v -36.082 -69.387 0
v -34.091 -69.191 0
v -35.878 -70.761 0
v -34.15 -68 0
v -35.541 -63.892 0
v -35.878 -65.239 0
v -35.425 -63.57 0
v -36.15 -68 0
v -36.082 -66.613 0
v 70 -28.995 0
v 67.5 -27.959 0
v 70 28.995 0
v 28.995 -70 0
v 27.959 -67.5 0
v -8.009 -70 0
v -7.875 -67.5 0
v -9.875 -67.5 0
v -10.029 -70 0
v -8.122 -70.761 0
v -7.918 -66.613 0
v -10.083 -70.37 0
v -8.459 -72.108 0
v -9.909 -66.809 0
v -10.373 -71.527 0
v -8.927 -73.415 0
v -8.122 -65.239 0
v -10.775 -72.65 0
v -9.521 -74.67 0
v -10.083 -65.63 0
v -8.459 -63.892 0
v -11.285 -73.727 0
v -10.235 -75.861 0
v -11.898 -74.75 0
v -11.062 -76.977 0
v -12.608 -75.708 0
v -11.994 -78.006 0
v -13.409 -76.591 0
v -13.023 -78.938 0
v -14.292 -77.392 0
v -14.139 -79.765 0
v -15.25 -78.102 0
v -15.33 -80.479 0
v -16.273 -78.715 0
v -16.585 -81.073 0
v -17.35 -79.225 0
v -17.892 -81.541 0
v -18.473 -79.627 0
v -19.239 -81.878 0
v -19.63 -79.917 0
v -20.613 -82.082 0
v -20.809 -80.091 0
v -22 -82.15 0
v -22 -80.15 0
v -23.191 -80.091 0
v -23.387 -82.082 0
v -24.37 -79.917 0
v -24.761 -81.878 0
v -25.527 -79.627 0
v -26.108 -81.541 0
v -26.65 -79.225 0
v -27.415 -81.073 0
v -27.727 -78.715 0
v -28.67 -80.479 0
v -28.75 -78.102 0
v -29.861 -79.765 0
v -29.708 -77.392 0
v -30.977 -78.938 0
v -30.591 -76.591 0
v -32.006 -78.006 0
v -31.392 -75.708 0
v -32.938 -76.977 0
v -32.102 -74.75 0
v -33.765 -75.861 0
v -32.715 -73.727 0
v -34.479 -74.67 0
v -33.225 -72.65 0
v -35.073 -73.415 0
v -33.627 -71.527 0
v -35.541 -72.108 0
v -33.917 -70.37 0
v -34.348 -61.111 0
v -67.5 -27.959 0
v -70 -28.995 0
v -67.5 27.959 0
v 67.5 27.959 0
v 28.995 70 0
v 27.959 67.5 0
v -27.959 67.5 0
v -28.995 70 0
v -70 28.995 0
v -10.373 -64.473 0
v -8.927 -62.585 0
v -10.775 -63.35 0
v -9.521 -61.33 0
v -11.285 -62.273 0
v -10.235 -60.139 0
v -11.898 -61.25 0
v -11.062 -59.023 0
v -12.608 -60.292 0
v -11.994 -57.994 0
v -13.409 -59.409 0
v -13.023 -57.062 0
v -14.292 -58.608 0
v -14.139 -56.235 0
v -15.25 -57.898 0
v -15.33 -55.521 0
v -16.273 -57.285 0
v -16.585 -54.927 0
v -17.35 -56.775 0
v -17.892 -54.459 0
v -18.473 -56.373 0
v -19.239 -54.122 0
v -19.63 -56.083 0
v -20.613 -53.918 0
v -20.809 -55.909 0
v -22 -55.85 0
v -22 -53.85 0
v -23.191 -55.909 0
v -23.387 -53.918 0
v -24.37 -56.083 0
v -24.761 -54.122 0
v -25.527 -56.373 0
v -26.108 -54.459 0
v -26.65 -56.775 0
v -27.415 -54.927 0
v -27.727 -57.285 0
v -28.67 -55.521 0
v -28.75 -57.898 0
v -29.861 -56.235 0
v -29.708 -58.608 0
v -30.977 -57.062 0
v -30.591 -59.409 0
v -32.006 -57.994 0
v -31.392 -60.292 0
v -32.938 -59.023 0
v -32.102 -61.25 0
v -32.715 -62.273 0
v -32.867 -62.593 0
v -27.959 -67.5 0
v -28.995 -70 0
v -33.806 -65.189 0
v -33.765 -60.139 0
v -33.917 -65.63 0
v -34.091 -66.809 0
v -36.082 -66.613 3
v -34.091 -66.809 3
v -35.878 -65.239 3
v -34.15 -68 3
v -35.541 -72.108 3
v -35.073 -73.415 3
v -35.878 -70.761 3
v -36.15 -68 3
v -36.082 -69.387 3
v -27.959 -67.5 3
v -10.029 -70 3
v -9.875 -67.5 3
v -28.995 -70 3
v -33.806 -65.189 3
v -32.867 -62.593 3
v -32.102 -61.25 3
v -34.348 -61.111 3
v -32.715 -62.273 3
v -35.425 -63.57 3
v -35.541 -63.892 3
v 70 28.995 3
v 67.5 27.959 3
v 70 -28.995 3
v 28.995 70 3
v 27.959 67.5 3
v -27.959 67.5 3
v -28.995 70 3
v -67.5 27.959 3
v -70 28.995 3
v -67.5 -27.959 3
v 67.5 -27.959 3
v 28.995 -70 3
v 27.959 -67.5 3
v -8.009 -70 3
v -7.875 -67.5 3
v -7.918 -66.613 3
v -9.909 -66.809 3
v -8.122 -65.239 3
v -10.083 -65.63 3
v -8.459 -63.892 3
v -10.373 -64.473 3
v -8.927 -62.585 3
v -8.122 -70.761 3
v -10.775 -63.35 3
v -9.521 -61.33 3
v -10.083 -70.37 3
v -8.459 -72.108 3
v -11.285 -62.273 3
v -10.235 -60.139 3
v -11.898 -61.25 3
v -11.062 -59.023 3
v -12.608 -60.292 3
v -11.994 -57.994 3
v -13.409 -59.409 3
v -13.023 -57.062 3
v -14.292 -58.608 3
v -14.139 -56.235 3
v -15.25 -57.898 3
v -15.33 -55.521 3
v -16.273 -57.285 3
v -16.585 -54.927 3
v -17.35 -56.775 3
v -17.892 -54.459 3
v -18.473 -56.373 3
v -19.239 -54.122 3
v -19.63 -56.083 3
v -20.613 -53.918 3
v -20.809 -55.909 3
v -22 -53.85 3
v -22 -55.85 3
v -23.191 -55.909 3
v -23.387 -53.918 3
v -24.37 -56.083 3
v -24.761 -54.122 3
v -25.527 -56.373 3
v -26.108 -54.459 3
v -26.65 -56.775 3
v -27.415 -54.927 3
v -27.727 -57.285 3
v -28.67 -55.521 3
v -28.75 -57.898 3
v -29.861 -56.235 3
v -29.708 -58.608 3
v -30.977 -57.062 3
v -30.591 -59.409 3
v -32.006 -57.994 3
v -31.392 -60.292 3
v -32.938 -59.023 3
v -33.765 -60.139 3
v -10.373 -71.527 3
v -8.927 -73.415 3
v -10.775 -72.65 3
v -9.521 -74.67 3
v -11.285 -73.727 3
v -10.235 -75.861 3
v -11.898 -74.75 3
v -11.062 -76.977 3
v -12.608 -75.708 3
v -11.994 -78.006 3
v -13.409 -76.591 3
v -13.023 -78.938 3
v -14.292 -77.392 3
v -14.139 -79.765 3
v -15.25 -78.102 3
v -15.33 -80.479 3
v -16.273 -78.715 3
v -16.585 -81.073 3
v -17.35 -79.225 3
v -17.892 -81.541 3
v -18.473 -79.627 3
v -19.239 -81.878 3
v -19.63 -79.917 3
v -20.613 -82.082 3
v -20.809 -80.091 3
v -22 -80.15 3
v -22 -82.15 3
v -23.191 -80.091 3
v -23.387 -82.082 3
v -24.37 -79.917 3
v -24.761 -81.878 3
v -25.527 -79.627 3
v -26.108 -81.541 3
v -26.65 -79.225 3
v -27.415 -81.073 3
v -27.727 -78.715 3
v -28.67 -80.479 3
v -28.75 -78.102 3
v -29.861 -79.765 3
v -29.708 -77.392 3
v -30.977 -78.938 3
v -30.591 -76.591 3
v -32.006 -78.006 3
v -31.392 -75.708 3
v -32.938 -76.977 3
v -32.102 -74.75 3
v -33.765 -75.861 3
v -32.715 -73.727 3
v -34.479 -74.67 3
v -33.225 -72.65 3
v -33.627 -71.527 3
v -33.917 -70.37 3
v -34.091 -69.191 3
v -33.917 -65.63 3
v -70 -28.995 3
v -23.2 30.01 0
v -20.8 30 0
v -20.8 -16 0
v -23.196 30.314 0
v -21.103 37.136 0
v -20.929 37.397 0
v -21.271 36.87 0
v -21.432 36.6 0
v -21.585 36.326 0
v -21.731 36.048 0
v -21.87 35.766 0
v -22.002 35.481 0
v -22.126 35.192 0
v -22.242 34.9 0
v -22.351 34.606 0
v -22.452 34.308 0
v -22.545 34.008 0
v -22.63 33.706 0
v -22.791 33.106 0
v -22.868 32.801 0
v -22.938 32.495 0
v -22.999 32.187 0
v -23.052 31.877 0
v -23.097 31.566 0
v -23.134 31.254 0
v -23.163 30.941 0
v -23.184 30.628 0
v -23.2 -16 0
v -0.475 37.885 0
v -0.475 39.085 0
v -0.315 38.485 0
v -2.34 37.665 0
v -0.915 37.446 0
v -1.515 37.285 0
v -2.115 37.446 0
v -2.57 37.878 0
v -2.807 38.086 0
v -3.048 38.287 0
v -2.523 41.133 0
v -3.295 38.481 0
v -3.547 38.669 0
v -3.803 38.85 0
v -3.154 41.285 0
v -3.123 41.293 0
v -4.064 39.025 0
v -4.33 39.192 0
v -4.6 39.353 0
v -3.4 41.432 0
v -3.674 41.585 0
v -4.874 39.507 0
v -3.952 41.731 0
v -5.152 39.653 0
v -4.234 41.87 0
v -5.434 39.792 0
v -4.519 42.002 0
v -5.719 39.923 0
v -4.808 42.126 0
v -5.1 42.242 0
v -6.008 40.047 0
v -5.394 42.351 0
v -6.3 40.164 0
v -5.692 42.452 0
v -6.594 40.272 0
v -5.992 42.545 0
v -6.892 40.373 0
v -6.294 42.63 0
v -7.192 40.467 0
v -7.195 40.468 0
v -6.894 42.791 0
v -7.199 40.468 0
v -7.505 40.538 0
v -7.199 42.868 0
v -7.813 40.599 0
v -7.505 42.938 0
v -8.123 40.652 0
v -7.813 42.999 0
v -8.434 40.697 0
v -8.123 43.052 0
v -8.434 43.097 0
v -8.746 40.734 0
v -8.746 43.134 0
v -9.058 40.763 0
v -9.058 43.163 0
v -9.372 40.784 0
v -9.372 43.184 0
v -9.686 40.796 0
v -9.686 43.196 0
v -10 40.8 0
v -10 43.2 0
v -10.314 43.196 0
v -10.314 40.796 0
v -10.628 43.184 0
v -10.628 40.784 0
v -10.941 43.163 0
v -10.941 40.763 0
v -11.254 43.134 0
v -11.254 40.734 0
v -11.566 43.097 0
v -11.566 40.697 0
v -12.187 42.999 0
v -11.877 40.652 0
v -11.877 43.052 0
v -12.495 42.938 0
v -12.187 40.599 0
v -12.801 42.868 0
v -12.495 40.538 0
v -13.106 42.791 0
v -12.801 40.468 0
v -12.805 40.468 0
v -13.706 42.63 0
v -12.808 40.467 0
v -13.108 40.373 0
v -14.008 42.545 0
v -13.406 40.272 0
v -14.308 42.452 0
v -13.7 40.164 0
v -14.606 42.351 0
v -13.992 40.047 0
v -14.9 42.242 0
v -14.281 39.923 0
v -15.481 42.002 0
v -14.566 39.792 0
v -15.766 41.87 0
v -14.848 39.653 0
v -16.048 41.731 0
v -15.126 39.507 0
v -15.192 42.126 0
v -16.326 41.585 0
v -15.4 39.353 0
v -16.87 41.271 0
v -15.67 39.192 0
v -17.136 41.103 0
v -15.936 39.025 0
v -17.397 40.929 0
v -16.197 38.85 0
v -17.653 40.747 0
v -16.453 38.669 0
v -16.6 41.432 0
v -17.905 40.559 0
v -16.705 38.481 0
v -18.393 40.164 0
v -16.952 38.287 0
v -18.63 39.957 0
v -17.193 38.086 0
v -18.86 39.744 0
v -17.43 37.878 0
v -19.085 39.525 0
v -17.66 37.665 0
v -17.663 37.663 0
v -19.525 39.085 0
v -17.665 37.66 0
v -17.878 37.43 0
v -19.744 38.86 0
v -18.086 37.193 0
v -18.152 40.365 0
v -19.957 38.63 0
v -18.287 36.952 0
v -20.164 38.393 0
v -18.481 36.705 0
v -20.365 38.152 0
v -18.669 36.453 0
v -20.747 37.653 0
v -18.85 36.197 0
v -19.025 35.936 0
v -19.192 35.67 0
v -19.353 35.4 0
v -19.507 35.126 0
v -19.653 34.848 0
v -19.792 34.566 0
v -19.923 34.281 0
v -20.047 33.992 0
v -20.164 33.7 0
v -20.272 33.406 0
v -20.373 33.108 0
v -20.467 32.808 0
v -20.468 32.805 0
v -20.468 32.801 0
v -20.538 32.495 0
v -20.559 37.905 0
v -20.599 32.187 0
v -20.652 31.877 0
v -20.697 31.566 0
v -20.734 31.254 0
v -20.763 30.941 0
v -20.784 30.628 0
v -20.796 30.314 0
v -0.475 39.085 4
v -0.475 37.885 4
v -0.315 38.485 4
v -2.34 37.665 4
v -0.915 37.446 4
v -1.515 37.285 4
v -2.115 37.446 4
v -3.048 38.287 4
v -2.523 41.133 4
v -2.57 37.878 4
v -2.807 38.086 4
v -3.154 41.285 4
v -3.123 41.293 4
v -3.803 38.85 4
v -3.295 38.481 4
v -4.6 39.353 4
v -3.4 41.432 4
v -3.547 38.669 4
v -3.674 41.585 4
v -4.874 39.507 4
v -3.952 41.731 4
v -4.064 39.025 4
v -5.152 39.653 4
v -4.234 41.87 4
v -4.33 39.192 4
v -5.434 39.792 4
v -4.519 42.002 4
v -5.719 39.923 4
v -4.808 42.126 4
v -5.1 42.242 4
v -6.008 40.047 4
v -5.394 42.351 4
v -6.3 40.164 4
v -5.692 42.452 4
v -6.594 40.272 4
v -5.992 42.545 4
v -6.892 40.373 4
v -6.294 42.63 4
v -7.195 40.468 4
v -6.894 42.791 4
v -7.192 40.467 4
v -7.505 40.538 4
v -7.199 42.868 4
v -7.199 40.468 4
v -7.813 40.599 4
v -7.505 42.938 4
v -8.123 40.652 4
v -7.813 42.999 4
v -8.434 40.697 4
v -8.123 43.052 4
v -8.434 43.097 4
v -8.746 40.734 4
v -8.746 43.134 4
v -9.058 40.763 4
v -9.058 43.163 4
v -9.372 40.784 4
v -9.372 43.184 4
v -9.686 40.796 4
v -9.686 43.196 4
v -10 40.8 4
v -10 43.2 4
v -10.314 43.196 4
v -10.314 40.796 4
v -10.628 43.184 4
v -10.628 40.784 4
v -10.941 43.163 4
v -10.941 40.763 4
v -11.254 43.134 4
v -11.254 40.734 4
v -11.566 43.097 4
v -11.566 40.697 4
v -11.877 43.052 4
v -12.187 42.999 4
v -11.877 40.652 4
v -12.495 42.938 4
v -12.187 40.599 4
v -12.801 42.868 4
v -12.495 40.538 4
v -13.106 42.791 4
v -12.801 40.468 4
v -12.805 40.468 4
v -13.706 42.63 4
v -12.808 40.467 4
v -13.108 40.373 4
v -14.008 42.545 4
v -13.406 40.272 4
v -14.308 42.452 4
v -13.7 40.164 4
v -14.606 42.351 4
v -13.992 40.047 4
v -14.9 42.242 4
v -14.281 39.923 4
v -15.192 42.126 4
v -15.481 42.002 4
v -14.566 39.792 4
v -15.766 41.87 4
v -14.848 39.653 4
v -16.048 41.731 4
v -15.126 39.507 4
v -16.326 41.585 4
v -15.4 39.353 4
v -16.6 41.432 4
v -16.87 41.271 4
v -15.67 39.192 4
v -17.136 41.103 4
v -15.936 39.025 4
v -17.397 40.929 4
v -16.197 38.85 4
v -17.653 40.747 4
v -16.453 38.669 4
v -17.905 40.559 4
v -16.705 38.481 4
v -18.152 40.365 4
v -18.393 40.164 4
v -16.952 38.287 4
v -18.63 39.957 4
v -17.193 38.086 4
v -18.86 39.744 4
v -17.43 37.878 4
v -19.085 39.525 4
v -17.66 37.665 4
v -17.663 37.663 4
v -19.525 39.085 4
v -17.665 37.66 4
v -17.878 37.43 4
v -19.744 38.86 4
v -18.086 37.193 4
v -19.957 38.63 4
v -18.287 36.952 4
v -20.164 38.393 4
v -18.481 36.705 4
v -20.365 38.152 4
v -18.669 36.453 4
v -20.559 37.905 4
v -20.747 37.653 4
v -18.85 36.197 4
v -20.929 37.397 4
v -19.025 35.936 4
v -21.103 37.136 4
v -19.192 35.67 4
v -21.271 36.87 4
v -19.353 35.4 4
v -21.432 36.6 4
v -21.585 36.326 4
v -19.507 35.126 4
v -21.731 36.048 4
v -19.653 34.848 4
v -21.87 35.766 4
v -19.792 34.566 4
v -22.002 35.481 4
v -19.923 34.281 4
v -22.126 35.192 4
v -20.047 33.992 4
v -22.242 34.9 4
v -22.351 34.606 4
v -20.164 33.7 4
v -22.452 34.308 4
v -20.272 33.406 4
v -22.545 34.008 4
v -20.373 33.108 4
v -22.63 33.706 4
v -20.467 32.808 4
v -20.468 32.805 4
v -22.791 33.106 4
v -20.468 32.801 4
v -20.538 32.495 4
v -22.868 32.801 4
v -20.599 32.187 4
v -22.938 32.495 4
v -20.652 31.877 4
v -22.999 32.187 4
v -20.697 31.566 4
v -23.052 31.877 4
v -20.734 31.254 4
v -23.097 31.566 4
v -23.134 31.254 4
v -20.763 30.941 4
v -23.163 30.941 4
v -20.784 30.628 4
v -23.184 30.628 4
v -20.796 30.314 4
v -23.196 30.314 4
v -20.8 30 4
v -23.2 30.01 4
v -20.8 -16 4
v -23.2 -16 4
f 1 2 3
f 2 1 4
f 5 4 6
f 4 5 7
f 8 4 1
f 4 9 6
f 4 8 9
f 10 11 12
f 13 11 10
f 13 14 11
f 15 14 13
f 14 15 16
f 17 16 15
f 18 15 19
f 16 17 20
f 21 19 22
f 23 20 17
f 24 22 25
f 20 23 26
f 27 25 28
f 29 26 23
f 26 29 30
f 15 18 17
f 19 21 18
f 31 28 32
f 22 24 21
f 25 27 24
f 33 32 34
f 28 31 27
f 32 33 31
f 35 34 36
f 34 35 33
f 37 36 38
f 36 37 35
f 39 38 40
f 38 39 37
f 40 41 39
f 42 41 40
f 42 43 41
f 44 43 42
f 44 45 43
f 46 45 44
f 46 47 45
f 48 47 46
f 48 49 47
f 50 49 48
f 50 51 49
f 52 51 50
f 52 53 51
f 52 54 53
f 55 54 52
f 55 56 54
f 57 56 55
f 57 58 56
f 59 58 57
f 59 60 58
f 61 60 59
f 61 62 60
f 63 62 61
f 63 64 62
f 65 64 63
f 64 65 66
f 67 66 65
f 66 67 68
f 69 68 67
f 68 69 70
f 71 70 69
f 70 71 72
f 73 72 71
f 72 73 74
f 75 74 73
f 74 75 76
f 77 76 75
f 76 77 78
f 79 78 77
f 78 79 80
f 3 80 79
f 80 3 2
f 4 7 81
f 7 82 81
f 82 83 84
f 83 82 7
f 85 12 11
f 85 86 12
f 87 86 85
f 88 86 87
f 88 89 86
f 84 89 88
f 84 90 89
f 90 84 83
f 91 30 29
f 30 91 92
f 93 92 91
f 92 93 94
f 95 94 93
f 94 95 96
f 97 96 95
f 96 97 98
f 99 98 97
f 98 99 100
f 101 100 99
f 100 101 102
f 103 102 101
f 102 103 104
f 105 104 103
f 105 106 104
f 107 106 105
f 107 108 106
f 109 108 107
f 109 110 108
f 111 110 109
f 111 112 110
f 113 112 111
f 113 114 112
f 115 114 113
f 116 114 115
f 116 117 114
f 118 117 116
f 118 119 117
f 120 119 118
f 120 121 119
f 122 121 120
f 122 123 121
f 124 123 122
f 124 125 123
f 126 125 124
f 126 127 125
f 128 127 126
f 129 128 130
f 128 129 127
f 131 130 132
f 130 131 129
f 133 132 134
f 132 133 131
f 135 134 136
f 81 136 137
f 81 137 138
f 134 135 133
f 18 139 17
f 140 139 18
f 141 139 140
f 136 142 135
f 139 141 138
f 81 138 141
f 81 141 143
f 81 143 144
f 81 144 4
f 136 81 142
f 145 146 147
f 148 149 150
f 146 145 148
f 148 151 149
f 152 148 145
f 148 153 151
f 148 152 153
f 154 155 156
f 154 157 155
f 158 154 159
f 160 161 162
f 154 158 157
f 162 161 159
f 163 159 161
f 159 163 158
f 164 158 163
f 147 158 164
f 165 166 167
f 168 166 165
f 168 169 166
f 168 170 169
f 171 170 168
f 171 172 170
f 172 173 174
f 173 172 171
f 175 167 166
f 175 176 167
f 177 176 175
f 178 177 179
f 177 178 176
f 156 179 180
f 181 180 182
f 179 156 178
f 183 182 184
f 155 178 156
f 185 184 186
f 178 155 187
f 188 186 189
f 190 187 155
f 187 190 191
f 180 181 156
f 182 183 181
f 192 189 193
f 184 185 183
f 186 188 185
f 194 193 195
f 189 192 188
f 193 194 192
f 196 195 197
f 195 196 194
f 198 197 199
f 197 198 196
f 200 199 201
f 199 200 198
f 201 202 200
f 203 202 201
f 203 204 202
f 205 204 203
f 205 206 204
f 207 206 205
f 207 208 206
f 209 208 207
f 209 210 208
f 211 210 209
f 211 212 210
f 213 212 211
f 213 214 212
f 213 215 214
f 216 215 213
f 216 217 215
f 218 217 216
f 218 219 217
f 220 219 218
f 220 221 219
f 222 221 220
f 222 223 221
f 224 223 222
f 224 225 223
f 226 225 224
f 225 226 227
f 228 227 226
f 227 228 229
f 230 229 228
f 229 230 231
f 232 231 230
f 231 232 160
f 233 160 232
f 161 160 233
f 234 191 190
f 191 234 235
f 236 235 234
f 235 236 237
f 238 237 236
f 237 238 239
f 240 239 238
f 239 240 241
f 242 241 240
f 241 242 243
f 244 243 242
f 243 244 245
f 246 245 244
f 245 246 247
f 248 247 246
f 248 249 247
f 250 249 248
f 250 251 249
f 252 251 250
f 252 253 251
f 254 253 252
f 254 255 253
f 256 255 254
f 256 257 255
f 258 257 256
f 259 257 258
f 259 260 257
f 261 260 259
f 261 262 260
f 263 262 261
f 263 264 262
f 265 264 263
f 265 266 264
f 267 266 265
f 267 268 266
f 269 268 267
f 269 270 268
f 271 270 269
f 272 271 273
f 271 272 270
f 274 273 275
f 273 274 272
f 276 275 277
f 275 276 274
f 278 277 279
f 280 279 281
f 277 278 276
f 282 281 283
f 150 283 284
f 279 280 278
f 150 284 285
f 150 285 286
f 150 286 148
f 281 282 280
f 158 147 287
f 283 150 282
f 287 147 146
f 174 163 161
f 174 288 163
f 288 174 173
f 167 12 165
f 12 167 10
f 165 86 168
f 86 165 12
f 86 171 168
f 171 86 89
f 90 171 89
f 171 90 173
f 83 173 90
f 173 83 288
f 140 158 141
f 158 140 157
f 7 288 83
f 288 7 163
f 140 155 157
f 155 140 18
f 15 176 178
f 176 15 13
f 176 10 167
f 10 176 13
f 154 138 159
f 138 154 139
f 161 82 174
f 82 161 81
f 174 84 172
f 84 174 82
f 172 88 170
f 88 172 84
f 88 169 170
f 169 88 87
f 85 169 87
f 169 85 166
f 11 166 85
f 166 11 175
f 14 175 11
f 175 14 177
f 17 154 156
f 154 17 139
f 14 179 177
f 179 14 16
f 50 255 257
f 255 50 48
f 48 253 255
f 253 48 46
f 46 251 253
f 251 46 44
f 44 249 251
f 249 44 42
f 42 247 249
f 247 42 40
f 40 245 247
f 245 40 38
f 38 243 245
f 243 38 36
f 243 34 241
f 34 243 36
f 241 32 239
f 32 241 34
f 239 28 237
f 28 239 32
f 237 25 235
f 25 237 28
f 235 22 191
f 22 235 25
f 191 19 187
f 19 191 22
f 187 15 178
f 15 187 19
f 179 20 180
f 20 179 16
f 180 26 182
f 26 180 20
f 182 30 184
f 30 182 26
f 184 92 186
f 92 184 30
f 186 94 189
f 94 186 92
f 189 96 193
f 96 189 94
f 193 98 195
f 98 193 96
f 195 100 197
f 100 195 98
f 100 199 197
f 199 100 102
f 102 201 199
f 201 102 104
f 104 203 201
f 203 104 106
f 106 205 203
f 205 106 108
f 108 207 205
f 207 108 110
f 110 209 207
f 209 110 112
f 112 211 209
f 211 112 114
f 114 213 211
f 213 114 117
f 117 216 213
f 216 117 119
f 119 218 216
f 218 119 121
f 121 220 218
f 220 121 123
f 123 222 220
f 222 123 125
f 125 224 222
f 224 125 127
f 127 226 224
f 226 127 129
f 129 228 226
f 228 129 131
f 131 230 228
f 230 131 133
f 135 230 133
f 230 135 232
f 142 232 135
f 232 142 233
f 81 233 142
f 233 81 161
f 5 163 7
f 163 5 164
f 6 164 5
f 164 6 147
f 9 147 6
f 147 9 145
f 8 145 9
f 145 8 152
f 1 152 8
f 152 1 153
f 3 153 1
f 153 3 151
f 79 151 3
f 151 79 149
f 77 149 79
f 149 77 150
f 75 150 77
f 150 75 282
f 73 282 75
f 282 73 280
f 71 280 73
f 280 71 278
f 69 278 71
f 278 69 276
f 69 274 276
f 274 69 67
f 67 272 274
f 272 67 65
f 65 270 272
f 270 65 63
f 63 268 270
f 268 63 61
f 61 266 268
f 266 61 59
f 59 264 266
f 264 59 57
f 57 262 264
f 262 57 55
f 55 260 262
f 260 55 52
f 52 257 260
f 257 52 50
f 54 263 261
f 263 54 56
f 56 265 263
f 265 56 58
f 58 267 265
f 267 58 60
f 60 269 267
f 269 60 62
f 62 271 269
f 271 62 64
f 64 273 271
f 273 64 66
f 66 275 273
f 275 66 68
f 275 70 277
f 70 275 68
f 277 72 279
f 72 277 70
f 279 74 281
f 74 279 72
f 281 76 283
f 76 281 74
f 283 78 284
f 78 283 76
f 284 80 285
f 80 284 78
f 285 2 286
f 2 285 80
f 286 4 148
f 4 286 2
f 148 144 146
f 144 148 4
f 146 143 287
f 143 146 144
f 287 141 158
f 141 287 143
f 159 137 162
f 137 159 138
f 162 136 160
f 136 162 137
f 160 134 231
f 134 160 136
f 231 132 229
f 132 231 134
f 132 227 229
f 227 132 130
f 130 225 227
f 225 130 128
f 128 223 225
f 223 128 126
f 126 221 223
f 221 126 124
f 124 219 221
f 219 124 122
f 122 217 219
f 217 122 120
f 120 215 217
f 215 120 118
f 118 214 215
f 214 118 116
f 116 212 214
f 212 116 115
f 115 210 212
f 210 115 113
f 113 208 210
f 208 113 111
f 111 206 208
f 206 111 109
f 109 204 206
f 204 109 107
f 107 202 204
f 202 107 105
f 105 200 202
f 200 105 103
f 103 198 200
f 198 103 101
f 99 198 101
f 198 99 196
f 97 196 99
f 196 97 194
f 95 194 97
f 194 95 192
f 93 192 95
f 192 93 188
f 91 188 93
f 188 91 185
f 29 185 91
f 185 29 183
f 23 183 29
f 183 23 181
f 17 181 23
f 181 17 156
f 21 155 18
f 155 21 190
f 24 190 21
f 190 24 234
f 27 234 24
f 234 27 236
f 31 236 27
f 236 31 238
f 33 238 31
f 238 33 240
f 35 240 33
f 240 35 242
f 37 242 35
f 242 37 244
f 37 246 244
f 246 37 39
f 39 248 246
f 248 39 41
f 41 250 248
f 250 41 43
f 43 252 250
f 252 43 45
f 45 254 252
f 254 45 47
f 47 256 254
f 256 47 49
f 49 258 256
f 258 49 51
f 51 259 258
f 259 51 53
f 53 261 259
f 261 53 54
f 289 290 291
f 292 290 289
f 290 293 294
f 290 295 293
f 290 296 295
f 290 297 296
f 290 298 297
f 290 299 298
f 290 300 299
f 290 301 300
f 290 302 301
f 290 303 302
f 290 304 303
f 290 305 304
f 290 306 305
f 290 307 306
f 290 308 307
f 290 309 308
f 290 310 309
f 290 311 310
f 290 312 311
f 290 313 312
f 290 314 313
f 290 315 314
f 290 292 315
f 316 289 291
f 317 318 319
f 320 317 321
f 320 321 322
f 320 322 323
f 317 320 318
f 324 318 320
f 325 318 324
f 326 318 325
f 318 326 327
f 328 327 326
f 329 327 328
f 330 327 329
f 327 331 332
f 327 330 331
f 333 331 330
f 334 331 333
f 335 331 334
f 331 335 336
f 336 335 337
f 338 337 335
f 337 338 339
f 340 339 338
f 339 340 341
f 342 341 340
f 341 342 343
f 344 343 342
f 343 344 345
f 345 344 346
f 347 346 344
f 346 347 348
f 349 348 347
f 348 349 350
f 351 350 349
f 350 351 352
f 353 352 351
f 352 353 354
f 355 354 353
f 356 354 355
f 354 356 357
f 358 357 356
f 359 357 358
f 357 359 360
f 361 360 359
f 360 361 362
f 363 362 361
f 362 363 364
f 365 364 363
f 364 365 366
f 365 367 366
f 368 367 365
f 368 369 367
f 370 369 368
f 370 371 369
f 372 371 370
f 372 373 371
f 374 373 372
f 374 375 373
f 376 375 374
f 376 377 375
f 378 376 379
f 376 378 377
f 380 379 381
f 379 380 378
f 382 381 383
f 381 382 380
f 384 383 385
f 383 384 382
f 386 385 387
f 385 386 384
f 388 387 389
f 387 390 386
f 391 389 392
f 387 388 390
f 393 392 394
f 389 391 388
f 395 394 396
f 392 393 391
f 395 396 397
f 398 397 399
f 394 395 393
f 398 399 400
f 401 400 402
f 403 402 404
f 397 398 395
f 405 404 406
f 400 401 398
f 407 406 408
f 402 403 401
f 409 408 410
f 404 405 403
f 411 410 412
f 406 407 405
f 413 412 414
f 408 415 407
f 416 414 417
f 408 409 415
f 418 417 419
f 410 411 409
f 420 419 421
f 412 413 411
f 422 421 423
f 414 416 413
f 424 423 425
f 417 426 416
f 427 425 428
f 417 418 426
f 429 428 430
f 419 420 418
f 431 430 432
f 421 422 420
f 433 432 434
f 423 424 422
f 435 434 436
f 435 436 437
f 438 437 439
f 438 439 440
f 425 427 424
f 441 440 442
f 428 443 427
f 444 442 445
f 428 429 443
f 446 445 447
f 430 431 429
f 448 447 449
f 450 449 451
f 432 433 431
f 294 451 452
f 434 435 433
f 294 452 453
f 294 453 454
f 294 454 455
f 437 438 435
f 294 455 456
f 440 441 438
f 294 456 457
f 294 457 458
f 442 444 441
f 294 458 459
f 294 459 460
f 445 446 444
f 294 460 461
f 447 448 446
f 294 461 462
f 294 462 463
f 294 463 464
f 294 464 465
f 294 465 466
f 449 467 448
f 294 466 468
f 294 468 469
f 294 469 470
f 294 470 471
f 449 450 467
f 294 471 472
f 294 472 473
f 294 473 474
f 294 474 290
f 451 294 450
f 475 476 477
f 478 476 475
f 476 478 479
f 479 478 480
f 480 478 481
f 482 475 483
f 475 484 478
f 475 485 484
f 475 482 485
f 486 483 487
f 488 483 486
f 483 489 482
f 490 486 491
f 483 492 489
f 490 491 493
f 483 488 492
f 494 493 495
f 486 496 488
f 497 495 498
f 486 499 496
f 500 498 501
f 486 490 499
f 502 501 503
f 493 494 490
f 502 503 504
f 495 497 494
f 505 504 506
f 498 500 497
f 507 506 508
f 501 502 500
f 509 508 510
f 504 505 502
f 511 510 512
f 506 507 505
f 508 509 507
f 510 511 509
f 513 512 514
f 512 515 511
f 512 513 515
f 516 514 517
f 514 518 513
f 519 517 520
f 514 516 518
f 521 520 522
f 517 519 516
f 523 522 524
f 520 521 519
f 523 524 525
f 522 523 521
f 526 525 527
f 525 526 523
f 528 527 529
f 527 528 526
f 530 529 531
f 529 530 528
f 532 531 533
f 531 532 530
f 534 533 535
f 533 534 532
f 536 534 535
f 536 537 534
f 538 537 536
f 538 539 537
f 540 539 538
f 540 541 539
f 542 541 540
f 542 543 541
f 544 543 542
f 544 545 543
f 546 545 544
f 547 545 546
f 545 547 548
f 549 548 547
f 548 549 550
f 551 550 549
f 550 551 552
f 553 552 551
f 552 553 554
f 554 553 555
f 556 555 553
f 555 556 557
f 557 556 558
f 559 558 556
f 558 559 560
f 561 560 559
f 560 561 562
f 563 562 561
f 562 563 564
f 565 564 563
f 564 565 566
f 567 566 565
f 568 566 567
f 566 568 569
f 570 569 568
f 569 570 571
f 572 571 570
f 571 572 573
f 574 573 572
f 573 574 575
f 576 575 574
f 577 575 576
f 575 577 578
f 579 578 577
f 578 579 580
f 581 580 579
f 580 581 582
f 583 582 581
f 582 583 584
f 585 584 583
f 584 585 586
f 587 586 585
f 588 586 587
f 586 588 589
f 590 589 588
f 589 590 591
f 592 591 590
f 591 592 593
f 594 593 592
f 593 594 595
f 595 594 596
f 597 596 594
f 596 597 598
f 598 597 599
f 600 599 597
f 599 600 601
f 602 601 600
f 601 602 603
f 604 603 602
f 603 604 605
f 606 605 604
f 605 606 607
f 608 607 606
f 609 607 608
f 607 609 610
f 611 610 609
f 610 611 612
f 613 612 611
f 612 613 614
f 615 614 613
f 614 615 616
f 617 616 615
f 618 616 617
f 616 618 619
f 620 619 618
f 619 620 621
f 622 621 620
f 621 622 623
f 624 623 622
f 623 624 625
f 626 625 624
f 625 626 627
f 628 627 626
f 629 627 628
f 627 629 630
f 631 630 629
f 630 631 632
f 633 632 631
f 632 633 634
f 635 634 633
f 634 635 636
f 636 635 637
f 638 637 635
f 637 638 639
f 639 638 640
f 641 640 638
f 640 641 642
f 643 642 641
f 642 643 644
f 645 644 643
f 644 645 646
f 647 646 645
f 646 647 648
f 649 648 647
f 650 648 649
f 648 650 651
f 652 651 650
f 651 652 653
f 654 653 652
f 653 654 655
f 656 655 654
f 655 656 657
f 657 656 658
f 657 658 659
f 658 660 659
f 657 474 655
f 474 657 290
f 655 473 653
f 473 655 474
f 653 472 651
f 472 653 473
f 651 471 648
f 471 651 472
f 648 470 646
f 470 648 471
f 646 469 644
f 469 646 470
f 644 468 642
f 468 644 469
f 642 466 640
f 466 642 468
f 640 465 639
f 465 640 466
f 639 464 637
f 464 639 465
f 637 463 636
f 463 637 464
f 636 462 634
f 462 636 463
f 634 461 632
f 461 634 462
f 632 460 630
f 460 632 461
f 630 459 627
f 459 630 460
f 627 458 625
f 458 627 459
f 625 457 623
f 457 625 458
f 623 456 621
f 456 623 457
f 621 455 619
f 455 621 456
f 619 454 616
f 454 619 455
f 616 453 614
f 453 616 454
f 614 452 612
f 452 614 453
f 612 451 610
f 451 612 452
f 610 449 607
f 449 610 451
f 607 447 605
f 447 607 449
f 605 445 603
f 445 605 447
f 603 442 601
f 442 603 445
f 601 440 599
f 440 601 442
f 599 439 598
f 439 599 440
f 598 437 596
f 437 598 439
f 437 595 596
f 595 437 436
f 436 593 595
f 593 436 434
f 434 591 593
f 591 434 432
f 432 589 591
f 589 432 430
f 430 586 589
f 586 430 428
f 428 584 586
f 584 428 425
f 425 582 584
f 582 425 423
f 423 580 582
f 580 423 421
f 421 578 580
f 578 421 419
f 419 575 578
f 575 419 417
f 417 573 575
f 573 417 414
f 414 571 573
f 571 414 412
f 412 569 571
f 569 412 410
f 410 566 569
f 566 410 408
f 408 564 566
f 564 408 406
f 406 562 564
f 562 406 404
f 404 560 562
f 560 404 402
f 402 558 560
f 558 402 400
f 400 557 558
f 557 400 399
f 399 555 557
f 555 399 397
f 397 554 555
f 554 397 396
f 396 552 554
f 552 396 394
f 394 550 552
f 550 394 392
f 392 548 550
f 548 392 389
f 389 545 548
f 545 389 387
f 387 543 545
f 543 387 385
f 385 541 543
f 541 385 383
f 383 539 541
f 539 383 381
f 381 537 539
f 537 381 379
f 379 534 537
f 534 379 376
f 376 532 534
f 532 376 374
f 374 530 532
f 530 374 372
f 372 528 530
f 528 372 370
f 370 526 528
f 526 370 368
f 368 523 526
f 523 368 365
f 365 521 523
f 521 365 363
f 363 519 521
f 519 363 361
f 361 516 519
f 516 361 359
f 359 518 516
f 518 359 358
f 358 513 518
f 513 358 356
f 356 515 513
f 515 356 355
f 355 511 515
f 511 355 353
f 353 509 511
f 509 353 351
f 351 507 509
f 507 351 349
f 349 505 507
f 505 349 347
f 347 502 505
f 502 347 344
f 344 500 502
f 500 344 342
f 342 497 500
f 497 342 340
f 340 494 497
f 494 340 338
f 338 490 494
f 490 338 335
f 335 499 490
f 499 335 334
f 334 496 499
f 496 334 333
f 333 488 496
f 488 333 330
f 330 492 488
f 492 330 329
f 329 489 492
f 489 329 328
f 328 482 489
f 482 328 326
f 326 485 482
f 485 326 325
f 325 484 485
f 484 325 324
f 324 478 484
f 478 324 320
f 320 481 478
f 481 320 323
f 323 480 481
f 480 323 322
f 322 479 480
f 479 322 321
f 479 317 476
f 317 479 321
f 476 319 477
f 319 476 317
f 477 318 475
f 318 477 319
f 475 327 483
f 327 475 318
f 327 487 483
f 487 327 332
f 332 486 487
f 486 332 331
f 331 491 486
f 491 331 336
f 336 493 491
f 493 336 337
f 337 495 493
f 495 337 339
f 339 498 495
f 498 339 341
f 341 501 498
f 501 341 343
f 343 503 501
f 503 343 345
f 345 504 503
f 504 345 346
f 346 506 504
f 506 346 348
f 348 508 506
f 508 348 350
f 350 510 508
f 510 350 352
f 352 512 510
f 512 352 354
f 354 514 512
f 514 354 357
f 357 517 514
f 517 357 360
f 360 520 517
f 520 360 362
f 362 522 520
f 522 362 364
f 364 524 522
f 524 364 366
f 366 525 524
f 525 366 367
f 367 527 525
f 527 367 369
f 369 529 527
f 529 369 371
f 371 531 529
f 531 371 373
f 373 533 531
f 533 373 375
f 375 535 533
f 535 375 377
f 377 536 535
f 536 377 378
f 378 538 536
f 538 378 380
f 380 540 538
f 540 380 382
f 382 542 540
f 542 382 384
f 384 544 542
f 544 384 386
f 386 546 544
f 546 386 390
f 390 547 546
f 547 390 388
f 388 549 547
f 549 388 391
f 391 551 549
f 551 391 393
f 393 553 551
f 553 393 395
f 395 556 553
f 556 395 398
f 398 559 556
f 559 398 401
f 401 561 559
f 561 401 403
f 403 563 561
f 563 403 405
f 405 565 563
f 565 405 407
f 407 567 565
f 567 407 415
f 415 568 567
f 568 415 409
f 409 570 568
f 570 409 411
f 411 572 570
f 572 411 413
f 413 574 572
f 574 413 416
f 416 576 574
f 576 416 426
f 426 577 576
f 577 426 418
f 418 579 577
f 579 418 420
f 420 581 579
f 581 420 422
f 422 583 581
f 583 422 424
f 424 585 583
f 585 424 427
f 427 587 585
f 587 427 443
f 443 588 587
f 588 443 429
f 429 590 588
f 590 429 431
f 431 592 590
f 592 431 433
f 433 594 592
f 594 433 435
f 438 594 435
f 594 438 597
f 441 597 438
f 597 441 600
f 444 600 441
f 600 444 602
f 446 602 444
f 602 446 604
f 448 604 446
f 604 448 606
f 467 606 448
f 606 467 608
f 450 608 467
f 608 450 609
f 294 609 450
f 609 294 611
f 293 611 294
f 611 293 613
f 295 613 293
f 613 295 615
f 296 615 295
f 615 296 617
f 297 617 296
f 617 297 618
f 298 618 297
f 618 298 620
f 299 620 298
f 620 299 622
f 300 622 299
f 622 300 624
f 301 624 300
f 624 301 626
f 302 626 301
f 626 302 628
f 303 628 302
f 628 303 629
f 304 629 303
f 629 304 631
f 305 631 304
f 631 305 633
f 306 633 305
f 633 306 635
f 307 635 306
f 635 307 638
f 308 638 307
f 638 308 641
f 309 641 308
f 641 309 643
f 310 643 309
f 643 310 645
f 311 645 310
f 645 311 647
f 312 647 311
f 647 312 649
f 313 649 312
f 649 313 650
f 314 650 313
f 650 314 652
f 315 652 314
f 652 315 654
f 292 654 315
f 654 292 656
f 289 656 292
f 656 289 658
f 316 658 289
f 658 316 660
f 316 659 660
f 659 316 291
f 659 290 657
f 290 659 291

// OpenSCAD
// Fit-test frame (prints in minutes): the base wall at one size, the USB-C jack position, and a guide for the cable.
// The octagon, jack and cable run use the same formulas as cad/base.scad and cad/params.scad.
//   openscad -D 'size=140' -D 'bend=135' -o stl/fit/fit-140-135.stl fit-frame.scad
//   openscad -D 'size=115' -D 'bend=180' -o stl/fit/fit-115-180.stl fit-frame.scad
size   = 140;     // across flats of the base being tested (mm)
bend   = 135;     // cable turn in degrees (90, 135, 180)
wall_t = 2.5;     // base_wall in params.scad
h      = 3;       // frame height (thin)
jack_x = -22 * size / 115 * 0 + -22;   // jack centre on the bottom wall; kept at the solver's value
cab_r  = 2.3;     // cable radius
r_bend = 12;      // cable_bend_r
stiff  = 54;      // usbj_stiff: flange face to the end of the strain relief
flex   = 72;      // cab_flex_design
guide  = 2.4;     // width of the guide ridge (a bit wider than the 4.6 mm cable would need, so it reads on the plate)

function oct_r(a) = a / 2 / cos(22.5);
module octagon2d(a) { rotate(22.5) circle(r = oct_r(a), $fn = 8); }

// Numbers the frame prints as a check
yb   = -size / 2 + stiff;                 // end of the stiff jack end
a    = 46;                                // straight run before the bend (cab_a)
phi  = bend;                              // degrees
b    = flex - a - r_bend * phi * PI / 180;  // straight run after the bend
echo(str("size ", size, " bend ", bend, " deg:  jack x=", jack_x, "  straight a=", a, "  bend r=", r_bend, "  straight b=", b, " (needs >= 3)"));

// centreline points: straight up, then the bend, then straight on
n = 90;
c   = [jack_x + r_bend, yb + a];
arc = [for (i = [0 : n]) let (t = 180 - phi * i / n) [c[0] + r_bend * cos(t), c[1] + r_bend * sin(t)]];
p1  = arc[n];
dir = [cos(180 - phi) * 0 + sin(phi), cos(phi)];        // unit direction after the bend (plate frame)
straight_end = [p1[0] + dir[0] * b, p1[1] + dir[1] * b];

module guide2d() {
    translate([jack_x - guide / 2, yb]) square([guide, a + 0.01]);
    for (i = [0 : n - 1]) hull() { translate(arc[i]) circle(d = guide, $fn = 12); translate(arc[i + 1]) circle(d = guide, $fn = 12); }
    hull() { translate(p1) circle(d = guide, $fn = 12); translate(straight_end) circle(d = guide, $fn = 12); }
}

// the ring
linear_extrude(h) difference() { octagon2d(size); octagon2d(size - 2 * wall_t); }
// the jack hole: 24.3 mm for the 23 mm body (a ring round it so the frame stays one piece)
linear_extrude(h) translate([jack_x, -size / 2 + 2]) difference() { circle(d = 24.3 + 4, $fn = 64); circle(d = 24.3, $fn = 64); }
// the guide
linear_extrude(h + 1) guide2d();
